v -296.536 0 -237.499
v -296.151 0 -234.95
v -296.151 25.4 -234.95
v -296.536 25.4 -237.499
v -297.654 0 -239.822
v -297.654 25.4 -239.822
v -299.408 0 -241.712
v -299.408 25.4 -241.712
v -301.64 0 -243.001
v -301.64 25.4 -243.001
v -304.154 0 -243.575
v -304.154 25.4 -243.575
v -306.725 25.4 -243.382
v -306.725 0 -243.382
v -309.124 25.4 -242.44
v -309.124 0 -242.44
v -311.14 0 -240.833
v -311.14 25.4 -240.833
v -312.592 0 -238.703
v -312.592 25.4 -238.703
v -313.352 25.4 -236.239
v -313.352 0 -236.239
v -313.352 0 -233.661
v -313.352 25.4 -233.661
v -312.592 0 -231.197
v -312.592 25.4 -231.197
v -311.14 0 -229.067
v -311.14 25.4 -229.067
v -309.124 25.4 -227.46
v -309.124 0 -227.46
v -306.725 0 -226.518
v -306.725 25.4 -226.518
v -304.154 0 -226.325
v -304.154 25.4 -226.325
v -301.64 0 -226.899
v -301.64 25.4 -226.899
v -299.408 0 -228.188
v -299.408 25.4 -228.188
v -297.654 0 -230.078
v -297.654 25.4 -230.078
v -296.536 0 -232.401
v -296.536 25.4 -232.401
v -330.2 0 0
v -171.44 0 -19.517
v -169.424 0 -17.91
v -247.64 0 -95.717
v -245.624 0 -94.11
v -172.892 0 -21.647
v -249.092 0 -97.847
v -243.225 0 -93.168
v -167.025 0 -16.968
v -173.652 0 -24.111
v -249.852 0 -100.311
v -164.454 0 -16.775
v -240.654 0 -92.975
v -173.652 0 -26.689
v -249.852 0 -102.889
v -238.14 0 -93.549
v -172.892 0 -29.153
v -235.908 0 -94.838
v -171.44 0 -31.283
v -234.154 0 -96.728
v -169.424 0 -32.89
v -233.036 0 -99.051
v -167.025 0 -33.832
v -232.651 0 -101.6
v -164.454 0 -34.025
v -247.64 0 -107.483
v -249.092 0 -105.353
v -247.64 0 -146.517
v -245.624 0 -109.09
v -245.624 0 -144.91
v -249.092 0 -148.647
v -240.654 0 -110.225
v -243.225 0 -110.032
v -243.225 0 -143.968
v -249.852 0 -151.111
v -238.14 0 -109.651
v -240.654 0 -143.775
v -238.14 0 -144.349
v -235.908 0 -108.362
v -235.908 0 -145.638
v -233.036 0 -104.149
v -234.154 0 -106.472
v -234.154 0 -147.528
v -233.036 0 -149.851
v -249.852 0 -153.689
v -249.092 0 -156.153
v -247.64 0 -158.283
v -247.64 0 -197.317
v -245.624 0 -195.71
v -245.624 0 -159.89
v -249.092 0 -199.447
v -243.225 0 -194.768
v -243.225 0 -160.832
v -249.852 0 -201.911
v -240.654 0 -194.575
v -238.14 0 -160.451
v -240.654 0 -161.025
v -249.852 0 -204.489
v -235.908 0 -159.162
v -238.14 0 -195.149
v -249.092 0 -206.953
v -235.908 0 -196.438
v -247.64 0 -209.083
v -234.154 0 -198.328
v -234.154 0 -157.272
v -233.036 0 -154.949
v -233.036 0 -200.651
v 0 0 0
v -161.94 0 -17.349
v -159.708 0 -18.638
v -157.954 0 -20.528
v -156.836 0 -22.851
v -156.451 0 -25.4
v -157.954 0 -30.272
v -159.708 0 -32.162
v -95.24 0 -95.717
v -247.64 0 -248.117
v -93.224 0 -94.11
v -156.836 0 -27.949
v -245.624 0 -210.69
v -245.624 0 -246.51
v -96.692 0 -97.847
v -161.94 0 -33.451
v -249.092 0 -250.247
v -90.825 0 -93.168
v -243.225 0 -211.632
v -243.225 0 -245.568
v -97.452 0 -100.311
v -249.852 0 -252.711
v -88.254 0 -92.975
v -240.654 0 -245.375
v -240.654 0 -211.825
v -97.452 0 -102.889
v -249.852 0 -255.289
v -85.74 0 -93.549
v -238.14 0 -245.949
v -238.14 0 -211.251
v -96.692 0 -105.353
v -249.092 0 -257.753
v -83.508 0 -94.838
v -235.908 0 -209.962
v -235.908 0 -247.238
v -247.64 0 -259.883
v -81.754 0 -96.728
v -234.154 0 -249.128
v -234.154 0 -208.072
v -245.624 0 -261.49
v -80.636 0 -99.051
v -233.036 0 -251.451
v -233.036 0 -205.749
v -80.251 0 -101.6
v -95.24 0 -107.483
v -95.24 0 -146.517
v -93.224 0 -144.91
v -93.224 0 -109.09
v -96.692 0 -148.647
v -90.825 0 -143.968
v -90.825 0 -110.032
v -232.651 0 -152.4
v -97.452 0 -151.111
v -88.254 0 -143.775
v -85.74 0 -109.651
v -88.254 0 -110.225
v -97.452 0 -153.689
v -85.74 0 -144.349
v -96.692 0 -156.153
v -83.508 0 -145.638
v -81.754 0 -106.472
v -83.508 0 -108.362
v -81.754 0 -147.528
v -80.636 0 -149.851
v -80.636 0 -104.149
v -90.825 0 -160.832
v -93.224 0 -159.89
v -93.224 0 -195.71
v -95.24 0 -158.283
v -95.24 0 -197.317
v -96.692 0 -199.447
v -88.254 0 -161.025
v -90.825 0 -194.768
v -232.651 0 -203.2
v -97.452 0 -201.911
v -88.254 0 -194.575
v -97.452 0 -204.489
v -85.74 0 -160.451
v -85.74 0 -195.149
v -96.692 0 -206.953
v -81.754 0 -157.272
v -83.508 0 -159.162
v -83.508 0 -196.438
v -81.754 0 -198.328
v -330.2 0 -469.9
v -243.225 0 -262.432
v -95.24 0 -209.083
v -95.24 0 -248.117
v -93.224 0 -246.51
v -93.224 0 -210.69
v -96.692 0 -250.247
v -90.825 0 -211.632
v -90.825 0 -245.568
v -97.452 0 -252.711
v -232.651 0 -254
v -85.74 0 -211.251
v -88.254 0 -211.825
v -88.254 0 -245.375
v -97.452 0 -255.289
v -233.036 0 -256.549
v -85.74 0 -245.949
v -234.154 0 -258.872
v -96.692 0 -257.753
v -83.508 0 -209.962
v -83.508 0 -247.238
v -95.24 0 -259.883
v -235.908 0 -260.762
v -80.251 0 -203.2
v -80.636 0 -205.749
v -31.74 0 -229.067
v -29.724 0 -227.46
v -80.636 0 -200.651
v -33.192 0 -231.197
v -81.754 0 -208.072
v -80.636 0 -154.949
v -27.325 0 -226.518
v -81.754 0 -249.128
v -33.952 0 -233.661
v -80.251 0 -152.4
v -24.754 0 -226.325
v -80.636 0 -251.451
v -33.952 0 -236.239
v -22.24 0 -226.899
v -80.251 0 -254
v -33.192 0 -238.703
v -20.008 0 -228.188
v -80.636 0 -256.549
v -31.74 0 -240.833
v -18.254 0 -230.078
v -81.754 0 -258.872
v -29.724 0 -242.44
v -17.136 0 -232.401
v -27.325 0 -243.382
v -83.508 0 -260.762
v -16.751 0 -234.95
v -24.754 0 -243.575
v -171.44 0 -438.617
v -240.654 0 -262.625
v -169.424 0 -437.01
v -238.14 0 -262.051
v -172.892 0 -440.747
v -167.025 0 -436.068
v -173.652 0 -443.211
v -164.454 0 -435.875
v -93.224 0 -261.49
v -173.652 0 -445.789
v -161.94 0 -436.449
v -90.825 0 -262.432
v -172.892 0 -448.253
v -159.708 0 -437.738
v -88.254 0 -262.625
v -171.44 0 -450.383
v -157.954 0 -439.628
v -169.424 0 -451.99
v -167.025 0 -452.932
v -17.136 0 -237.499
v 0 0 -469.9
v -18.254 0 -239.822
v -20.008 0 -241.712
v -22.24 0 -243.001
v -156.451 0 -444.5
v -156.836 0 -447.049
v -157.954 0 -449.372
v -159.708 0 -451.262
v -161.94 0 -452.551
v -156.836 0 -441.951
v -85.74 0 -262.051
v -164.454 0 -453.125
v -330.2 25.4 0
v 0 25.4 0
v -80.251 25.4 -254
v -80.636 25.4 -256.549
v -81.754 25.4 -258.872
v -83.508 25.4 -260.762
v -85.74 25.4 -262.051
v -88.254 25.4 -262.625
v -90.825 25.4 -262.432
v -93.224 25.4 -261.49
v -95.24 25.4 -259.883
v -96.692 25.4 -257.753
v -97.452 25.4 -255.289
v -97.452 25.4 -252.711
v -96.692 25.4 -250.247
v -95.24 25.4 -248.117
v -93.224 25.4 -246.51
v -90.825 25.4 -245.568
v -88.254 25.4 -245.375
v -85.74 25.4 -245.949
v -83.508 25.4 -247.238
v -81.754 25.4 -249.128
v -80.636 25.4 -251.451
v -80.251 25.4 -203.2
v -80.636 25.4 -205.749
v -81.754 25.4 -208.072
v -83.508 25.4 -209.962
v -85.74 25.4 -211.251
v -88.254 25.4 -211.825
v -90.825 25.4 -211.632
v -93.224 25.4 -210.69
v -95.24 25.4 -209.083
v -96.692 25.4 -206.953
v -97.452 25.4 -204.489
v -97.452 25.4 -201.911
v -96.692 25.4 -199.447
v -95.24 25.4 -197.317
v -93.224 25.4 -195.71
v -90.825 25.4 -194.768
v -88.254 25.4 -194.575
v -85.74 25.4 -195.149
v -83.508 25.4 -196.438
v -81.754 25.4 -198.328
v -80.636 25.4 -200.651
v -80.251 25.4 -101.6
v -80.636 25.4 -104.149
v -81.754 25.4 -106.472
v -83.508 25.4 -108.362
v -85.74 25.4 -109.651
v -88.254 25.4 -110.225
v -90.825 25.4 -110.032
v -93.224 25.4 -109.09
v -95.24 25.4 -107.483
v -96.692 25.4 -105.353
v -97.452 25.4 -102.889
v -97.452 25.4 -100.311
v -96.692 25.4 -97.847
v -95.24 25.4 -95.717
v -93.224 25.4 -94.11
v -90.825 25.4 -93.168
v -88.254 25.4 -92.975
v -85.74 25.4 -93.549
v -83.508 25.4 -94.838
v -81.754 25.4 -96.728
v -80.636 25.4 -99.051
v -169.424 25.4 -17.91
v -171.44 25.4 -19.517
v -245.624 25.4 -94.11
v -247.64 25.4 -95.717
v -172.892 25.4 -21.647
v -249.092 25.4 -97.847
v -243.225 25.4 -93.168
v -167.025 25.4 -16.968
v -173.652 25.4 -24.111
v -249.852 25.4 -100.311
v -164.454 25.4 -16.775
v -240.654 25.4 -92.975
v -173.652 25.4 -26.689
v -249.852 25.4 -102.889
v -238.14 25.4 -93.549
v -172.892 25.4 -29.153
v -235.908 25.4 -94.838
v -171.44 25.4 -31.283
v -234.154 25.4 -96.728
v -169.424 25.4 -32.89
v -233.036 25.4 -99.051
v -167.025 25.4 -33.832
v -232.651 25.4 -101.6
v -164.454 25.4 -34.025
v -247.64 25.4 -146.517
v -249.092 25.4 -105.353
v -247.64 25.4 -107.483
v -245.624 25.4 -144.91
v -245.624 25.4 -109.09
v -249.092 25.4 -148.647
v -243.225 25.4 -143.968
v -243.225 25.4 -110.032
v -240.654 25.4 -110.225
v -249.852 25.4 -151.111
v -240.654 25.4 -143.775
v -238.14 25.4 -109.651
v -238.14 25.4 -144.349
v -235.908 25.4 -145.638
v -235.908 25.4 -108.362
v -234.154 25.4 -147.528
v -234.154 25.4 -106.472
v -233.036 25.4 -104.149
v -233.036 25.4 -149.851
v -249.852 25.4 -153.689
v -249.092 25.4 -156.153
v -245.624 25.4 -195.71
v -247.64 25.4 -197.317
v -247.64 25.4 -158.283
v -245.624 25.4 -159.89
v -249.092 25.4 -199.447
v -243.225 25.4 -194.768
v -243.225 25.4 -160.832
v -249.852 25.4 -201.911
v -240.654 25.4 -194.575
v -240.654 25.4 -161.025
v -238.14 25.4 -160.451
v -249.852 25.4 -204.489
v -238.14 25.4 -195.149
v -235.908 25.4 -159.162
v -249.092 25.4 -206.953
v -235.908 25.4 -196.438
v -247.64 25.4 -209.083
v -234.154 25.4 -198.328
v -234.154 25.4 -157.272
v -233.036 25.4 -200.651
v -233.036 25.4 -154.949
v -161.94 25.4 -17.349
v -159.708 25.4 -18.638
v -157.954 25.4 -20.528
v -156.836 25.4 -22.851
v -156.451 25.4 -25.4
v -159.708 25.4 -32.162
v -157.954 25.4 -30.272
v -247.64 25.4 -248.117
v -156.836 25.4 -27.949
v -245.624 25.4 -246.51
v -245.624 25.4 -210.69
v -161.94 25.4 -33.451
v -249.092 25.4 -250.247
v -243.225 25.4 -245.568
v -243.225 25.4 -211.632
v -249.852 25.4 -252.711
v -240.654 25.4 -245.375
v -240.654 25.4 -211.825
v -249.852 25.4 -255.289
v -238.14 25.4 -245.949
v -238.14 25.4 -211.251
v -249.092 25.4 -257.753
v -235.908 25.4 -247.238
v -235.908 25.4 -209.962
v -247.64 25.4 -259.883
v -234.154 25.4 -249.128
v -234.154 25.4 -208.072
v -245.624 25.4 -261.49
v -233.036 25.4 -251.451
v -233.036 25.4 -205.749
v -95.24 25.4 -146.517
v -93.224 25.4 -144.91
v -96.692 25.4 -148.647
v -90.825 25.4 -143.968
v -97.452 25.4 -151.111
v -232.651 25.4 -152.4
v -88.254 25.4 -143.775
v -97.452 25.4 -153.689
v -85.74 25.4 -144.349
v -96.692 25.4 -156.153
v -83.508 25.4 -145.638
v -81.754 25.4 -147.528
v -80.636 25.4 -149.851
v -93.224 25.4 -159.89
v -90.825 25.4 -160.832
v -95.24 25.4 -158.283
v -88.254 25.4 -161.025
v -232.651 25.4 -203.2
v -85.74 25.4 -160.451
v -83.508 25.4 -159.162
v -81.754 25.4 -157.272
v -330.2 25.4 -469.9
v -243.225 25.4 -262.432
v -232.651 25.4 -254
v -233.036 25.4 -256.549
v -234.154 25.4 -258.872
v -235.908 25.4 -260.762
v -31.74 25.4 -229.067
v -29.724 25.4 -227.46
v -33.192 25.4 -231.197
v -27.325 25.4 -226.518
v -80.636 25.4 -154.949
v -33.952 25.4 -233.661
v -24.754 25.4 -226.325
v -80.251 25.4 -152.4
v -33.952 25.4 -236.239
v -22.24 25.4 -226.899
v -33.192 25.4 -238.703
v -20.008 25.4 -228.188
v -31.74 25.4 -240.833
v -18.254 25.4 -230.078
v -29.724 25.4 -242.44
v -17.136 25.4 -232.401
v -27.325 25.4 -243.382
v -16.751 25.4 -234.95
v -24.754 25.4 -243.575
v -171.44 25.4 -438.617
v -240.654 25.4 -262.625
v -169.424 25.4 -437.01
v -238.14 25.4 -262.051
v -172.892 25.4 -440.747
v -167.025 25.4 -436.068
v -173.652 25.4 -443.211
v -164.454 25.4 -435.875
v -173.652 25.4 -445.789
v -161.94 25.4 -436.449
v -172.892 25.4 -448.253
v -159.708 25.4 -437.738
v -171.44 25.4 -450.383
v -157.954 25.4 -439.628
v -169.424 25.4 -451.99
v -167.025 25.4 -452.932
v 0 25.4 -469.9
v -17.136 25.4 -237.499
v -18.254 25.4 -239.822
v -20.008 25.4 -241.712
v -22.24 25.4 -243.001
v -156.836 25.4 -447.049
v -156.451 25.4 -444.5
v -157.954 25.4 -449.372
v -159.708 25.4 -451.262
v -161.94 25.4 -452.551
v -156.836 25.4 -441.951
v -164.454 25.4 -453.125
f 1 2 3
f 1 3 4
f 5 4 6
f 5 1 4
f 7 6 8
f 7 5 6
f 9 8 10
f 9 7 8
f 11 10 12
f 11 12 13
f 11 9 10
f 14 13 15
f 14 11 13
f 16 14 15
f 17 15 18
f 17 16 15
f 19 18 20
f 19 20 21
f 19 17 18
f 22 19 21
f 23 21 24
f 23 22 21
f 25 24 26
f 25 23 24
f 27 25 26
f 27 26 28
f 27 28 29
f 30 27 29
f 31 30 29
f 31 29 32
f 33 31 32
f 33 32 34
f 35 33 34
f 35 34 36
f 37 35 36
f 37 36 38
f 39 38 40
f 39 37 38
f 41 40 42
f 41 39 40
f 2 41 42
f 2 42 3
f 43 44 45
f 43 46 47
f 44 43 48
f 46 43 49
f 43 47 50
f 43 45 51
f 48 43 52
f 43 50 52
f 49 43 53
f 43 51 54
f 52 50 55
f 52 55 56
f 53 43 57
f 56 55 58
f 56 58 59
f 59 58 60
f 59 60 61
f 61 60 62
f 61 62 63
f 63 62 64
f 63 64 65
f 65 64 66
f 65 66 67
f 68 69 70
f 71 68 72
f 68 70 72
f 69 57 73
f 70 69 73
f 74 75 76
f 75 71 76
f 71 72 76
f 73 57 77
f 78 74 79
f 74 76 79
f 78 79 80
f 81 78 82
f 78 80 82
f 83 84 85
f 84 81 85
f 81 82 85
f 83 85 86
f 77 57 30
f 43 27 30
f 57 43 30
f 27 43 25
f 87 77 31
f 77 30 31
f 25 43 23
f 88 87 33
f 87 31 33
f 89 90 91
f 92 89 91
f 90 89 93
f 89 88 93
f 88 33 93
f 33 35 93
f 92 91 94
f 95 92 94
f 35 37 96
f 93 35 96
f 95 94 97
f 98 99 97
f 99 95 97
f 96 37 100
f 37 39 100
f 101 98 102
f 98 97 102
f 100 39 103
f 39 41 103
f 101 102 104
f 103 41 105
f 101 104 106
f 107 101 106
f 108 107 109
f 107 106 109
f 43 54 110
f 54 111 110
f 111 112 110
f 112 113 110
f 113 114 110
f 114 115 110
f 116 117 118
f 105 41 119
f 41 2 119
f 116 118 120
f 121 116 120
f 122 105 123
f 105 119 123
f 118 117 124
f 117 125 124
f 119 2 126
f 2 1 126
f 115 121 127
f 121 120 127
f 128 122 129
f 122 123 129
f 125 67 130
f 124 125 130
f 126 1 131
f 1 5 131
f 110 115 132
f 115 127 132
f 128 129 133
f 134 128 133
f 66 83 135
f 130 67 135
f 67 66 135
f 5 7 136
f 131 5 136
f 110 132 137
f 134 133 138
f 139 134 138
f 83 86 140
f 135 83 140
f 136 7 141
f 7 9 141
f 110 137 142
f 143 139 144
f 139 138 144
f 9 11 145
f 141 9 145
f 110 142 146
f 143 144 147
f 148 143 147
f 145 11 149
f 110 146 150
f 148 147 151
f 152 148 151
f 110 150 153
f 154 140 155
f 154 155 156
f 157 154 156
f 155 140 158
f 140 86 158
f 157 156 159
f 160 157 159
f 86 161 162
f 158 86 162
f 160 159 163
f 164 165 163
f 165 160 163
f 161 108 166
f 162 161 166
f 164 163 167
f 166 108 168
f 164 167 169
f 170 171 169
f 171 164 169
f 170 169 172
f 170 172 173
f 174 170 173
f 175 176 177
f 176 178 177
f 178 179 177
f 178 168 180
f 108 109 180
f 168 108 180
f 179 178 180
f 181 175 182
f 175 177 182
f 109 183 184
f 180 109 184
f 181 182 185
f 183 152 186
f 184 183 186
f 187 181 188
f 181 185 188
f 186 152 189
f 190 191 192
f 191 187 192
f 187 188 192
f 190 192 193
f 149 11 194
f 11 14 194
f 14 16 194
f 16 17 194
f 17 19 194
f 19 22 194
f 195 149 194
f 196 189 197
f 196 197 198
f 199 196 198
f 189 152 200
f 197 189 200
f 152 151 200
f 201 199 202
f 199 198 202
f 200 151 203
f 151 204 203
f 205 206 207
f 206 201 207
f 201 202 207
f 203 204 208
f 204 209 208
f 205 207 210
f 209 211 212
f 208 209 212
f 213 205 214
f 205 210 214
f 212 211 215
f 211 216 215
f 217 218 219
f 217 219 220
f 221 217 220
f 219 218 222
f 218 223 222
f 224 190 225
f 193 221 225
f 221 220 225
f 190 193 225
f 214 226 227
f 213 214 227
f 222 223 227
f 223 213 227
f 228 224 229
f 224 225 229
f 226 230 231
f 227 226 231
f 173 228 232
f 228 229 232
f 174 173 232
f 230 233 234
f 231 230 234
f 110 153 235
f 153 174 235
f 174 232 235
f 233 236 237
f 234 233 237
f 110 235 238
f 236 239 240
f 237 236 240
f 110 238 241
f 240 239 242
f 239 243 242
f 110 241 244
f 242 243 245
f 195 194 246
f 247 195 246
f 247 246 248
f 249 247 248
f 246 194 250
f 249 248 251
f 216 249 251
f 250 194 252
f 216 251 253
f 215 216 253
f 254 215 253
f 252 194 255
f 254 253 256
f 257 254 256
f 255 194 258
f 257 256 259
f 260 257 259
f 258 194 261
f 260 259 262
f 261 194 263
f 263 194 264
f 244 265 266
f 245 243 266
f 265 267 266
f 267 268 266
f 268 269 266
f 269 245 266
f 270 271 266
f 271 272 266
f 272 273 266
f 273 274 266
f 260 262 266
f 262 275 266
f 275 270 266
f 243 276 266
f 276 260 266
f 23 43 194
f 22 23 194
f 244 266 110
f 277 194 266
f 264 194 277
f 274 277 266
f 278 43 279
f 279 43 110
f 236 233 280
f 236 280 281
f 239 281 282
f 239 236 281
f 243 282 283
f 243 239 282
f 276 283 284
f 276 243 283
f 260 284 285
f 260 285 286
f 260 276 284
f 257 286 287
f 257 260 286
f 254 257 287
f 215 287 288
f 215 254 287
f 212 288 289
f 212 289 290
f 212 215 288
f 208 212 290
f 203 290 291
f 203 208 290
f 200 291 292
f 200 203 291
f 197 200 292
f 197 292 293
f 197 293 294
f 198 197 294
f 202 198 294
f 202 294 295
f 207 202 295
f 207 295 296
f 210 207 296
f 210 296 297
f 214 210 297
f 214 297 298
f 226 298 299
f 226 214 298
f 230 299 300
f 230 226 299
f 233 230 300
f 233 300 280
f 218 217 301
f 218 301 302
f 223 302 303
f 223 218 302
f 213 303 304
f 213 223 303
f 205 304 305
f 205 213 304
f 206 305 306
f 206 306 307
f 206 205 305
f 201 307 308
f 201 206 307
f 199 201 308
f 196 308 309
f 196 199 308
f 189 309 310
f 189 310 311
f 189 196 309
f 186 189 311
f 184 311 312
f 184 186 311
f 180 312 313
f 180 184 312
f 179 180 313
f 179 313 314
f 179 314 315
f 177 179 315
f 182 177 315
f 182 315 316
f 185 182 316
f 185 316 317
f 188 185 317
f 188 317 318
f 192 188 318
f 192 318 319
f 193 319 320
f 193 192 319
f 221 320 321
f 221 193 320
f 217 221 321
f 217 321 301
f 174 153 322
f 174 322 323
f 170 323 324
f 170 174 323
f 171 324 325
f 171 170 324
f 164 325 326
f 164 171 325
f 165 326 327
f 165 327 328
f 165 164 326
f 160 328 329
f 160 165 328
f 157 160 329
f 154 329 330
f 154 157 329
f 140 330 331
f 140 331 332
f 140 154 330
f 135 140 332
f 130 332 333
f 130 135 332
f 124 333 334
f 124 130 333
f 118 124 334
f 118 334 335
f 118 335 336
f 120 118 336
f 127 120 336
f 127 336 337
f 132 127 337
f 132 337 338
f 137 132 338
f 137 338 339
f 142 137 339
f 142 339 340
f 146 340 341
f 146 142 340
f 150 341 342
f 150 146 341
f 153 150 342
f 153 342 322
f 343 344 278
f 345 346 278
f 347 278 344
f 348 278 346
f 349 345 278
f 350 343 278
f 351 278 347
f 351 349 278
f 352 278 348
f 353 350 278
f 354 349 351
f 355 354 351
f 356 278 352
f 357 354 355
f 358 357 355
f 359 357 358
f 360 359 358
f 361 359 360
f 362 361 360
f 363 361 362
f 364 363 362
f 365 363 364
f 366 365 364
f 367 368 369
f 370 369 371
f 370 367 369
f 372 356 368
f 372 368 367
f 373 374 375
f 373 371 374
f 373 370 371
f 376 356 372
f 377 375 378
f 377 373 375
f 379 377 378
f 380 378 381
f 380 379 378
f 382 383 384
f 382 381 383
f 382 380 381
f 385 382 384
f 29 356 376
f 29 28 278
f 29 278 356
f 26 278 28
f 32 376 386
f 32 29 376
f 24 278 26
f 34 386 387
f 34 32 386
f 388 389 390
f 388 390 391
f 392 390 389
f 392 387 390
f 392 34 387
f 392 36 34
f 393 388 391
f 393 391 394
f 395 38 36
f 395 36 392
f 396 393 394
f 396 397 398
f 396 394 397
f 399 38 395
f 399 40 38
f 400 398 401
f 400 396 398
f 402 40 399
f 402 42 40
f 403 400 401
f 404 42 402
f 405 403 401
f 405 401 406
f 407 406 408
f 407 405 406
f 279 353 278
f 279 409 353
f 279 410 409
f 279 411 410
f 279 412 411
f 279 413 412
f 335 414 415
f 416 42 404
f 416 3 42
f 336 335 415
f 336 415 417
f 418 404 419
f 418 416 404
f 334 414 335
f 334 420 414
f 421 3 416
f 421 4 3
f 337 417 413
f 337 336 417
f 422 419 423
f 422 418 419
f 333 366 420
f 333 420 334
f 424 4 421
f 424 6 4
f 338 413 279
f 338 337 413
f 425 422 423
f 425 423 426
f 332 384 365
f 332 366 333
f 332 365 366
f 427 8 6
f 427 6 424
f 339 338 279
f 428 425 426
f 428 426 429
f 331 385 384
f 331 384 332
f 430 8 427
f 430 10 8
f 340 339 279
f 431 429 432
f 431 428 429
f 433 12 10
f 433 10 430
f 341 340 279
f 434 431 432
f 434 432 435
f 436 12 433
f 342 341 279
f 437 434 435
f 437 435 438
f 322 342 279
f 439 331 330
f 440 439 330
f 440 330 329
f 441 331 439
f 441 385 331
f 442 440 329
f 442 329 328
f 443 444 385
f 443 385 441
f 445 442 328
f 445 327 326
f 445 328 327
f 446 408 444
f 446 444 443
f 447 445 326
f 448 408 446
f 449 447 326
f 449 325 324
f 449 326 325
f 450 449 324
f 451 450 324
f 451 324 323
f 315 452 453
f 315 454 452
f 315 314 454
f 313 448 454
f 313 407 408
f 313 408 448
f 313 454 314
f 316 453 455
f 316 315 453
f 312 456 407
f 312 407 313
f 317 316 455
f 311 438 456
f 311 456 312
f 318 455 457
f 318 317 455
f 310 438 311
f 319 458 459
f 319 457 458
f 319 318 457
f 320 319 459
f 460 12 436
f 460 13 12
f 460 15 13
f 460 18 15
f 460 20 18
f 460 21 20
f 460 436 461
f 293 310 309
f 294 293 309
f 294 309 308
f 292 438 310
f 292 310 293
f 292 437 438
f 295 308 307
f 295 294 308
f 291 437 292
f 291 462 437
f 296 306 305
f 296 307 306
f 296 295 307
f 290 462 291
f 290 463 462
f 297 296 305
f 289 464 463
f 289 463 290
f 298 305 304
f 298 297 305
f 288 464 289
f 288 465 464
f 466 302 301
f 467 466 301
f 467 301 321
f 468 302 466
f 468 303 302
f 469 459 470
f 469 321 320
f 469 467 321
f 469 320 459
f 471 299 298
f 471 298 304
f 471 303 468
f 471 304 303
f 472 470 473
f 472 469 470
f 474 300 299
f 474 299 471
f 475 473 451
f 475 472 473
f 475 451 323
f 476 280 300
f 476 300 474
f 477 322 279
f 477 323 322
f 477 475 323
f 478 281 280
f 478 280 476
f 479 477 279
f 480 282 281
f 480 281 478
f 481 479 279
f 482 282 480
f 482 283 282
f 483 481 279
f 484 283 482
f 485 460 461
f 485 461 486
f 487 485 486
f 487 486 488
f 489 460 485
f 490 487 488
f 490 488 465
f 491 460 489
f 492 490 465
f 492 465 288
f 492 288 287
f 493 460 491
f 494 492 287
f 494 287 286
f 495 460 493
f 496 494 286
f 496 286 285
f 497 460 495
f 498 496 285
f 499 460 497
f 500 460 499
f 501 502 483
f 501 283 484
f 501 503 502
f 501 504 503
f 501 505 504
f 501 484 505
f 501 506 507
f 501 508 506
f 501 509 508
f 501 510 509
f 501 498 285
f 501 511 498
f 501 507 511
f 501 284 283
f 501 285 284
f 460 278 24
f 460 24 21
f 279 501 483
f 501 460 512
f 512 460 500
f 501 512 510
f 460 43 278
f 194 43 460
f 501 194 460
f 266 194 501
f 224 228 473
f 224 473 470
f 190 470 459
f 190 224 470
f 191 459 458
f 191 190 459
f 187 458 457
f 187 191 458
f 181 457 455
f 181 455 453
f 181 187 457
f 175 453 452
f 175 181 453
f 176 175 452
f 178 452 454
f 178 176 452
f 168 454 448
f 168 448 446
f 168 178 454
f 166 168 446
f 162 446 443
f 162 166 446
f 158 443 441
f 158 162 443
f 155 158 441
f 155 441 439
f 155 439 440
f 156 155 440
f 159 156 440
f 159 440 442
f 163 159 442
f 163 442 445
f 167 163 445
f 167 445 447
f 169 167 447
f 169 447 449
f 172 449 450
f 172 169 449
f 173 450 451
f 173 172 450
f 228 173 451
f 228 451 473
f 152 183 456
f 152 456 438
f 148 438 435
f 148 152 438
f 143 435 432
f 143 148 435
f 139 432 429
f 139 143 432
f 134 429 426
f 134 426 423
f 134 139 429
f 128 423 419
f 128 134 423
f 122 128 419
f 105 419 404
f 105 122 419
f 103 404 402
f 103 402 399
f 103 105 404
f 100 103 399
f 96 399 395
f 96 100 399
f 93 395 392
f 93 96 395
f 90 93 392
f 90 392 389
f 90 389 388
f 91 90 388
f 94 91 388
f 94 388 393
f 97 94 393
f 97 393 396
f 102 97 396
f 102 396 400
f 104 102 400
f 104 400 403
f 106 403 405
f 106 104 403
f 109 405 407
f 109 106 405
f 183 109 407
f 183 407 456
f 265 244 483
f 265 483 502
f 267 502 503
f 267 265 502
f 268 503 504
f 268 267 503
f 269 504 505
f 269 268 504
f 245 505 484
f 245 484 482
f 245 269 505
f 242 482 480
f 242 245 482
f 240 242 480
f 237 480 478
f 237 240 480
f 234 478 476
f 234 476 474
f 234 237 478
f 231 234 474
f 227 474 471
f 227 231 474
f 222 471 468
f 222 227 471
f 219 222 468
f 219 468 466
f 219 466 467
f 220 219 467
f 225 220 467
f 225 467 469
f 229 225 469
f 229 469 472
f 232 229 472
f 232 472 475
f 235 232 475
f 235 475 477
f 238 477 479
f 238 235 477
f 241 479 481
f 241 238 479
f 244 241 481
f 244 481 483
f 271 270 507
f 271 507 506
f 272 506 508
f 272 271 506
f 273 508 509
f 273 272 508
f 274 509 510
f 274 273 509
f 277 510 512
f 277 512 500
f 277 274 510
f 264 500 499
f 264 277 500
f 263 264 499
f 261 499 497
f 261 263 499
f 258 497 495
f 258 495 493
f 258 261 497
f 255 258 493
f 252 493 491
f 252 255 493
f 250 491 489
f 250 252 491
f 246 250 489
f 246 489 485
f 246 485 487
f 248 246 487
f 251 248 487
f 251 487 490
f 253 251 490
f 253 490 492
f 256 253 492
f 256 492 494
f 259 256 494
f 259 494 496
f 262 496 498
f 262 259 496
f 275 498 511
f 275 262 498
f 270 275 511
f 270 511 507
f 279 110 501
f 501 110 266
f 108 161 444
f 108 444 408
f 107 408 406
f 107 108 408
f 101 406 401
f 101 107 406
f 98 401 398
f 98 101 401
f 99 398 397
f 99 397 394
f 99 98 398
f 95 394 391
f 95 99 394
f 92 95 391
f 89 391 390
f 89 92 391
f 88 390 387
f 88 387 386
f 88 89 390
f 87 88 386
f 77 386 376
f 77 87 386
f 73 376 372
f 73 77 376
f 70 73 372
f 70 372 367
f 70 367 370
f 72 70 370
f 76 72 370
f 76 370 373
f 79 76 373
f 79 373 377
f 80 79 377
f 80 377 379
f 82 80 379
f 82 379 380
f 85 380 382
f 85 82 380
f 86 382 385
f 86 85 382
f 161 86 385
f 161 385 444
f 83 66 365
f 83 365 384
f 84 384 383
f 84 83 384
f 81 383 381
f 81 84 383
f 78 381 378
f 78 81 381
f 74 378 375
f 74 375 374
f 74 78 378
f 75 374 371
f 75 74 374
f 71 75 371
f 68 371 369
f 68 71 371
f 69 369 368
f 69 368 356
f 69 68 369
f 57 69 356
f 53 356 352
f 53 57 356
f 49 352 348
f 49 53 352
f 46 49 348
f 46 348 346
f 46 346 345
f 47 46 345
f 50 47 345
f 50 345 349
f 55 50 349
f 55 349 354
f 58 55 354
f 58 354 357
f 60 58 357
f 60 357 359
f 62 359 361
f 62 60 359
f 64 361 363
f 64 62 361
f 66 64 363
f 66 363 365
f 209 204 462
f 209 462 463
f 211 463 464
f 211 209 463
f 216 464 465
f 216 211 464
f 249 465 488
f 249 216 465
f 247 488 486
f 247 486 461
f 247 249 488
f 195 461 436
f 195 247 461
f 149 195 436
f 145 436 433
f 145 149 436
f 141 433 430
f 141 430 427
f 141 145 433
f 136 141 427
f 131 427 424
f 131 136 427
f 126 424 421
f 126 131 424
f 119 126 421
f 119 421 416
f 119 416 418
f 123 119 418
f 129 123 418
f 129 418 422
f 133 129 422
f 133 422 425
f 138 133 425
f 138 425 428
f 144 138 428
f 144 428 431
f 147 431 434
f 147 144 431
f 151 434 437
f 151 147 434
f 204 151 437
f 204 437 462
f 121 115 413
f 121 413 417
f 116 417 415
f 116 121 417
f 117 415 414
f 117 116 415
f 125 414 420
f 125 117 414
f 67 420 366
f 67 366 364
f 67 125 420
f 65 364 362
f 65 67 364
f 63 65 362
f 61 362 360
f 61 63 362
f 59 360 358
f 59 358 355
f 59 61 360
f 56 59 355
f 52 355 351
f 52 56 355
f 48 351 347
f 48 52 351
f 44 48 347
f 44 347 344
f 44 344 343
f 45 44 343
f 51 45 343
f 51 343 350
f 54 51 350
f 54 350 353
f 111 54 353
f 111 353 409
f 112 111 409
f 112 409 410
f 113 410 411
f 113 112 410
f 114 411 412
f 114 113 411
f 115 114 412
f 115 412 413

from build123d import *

# Parameters (mm, degrees)
SKETCH1_W           = 330.2
SKETCH1_H           = 469.9
SKETCH1_R           = 8.6487
BOSS_EXTRUDE1_DEPTH = 25.4


with BuildPart() as part:
    # Sketch1 → Boss-Extrude1 (new body)
    with BuildSketch(Plane(origin=(0, 0, 0), x_dir=(1, 0, 0), z_dir=(0, 1, 0))):
        with Locations((-165.1, 234.95)):
            Rectangle(SKETCH1_W, SKETCH1_H)
        with Locations((-165.1, 444.5)):
            Circle(SKETCH1_R, mode=Mode.SUBTRACT)
        with Locations((-25.4, 234.95)):
            Circle(SKETCH1_R, mode=Mode.SUBTRACT)
        with Locations((-165.1, 25.4)):
            Circle(SKETCH1_R, mode=Mode.SUBTRACT)
        with Locations((-304.8, 234.95)):
            Circle(SKETCH1_R, mode=Mode.SUBTRACT)
        with Locations((-88.9, 101.6)):
            Circle(SKETCH1_R, mode=Mode.SUBTRACT)
        with Locations((-88.9, 152.4)):
            Circle(SKETCH1_R, mode=Mode.SUBTRACT)
        with Locations((-88.9, 203.2)):
            Circle(SKETCH1_R, mode=Mode.SUBTRACT)
        with Locations((-88.9, 254)):
            Circle(SKETCH1_R, mode=Mode.SUBTRACT)
        with Locations((-241.3, 101.6)):
            Circle(SKETCH1_R, mode=Mode.SUBTRACT)
        with Locations((-241.3, 152.4)):
            Circle(SKETCH1_R, mode=Mode.SUBTRACT)
        with Locations((-241.3, 203.2)):
            Circle(SKETCH1_R, mode=Mode.SUBTRACT)
        with Locations((-241.3, 254)):
            Circle(SKETCH1_R, mode=Mode.SUBTRACT)
    extrude(amount=BOSS_EXTRUDE1_DEPTH)


solid = part.part
